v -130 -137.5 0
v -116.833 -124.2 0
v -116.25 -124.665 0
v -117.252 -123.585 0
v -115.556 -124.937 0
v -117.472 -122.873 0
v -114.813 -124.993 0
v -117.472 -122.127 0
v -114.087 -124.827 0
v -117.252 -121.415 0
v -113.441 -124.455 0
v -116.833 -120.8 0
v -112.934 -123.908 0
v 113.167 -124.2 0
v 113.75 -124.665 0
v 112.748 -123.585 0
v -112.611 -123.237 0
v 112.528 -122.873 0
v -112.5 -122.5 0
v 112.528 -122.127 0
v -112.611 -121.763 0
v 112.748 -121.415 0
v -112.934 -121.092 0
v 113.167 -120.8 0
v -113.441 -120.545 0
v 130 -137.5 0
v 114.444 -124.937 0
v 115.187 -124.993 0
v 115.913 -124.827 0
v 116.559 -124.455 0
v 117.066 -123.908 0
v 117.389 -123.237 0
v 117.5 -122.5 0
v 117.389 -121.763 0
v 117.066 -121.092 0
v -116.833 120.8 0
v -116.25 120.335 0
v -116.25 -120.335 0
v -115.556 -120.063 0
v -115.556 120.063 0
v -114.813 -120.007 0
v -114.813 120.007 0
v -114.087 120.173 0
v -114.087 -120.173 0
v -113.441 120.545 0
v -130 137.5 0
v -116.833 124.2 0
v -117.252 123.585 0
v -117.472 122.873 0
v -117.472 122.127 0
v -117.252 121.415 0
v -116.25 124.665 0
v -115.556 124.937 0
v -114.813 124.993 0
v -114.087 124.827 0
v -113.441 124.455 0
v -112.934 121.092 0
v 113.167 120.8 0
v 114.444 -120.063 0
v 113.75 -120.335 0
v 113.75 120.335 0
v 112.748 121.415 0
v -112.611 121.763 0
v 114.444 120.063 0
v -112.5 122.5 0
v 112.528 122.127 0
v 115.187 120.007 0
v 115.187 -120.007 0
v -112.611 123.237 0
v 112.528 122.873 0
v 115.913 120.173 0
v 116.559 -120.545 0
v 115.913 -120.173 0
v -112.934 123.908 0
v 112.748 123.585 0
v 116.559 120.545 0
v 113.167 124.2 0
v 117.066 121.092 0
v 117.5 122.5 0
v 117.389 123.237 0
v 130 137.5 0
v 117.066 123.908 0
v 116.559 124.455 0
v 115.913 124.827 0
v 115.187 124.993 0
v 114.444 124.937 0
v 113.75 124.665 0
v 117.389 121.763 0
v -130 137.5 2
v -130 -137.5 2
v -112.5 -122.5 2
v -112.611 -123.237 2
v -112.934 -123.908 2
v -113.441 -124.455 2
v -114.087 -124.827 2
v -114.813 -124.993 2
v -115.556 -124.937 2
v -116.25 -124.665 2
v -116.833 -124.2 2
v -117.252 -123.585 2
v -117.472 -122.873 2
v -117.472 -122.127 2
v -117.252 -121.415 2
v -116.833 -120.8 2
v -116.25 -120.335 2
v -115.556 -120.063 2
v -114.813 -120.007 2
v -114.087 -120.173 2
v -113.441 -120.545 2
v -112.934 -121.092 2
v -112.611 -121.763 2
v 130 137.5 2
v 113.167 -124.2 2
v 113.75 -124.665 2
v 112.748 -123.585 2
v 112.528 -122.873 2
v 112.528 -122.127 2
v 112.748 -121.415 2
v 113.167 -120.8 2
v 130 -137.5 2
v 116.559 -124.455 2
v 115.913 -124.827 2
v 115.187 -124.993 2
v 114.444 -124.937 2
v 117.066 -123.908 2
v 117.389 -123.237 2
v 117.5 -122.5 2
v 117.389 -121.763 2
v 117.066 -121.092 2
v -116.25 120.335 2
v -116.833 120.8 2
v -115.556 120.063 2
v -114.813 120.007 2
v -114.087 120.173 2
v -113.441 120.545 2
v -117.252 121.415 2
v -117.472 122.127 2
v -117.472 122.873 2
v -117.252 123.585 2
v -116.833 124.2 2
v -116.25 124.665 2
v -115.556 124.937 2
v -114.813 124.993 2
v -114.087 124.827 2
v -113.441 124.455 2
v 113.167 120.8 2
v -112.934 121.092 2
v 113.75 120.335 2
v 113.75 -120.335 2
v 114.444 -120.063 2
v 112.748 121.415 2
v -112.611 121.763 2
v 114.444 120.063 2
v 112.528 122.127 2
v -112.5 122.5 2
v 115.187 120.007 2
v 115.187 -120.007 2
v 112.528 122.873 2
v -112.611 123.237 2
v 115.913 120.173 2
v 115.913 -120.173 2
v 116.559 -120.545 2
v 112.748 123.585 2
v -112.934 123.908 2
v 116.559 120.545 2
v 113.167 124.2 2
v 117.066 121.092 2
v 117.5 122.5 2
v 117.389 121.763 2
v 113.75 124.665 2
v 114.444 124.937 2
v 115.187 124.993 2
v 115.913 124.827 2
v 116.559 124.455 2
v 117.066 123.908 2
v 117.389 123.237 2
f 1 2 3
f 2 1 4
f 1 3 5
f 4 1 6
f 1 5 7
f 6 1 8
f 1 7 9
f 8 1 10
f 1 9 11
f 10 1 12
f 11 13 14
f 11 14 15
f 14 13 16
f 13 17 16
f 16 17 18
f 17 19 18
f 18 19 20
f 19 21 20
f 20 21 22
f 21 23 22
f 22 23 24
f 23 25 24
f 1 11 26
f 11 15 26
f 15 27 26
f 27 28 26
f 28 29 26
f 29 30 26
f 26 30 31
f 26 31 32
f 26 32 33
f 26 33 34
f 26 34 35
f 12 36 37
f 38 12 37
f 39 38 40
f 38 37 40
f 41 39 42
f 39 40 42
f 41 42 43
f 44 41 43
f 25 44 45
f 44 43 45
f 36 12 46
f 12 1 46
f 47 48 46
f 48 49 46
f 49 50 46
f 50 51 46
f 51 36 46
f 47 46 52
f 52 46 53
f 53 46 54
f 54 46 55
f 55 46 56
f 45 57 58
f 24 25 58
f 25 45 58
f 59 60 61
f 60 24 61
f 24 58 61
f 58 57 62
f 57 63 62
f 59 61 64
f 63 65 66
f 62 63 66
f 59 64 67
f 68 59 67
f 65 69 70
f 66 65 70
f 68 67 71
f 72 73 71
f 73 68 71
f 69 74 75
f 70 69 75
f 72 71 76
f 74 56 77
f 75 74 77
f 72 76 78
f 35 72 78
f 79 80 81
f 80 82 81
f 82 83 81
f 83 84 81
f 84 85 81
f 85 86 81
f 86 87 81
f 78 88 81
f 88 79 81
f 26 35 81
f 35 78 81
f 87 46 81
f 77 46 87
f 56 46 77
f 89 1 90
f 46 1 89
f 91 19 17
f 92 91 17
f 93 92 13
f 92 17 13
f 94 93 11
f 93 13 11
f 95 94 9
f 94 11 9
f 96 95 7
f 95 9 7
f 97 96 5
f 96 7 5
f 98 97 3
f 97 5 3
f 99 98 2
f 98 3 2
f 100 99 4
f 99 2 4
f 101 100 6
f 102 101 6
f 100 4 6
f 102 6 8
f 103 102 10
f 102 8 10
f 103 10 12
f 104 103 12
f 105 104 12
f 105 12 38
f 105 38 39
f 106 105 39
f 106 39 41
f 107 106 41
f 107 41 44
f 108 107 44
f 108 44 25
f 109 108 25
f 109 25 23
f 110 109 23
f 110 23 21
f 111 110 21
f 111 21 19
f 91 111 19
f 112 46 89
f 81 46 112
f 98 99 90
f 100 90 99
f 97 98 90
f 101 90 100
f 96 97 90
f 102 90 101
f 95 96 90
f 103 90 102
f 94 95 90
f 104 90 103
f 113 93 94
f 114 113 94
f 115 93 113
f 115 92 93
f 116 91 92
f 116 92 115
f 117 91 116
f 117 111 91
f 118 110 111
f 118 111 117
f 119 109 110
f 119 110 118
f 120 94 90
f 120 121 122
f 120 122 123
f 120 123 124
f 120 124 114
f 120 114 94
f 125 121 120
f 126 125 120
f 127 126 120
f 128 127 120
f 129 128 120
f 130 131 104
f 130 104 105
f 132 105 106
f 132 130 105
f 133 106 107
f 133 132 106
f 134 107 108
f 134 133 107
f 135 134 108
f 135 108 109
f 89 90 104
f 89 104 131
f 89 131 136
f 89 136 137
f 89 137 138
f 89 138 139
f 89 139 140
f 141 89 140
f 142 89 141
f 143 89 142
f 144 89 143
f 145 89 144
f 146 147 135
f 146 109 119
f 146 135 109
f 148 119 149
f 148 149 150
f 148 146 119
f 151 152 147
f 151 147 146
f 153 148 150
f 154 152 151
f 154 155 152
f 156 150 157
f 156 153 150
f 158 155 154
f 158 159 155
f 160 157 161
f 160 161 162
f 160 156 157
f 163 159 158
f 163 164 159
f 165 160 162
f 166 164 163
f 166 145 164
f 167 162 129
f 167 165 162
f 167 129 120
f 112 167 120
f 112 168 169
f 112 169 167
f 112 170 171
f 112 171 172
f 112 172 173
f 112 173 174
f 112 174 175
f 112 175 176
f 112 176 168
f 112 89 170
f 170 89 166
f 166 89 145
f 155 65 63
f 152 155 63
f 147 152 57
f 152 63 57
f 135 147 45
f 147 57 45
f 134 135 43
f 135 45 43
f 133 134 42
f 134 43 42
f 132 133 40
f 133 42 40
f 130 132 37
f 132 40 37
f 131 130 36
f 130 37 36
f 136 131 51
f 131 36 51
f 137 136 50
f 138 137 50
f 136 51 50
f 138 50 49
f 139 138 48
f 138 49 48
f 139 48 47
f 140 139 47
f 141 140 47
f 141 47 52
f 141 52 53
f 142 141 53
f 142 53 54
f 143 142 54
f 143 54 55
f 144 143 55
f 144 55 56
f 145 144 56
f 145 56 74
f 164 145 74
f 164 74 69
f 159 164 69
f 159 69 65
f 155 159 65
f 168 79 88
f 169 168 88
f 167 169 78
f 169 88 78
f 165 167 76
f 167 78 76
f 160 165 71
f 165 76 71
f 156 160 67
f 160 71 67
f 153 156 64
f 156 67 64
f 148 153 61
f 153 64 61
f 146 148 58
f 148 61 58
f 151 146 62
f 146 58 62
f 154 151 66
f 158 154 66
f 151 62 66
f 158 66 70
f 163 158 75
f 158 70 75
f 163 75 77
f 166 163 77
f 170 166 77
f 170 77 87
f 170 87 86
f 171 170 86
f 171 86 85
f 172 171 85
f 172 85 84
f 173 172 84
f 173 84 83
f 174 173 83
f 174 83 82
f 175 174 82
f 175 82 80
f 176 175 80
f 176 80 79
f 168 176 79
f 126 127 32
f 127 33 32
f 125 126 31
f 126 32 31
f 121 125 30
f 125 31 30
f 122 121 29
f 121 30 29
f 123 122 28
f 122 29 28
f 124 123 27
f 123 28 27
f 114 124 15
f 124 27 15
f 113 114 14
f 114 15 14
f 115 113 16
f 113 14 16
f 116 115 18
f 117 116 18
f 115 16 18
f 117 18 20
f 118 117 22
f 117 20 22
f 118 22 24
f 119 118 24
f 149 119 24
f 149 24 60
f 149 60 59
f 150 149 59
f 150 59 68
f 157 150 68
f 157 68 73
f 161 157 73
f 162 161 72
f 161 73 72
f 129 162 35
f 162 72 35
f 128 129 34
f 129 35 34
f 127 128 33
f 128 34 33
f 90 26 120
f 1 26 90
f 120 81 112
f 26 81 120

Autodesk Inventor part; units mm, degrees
ref_plane "YZ Plane" through (0, 0, 0) normal (1, 0, 0) x (0, 1, 0)
ref_plane "XZ Plane" through (0, 0, 0) normal (0, 1, 0) x (-1, 0, 0)
ref_plane "XY Plane" through (0, 0, 0) normal (0, 0, 1) x (1, 0, 0)
sketch "Esquisse1" plane through (0, 0, 0) normal (0, 0, 1) x (1, 0, 0)
  line L0 (-130, 137.5) -> (130, 137.5)
  line L1 (130, 137.5) -> (130, -137.5)
  line L2 (130, -137.5) -> (-130, -137.5)
  line L3 (-130, -137.5) -> (-130, 137.5)
  line L4 (-130, 137.5) -> (130, -137.5) construction
  line L5 (130, 137.5) -> (-130, -137.5) construction
  line L6 (-117.5, -125) -> (117.5, -125)
  line L7 (117.5, -125) -> (117.5, 125)
  line L8 (117.5, 125) -> (-117.5, 125)
  line L9 (-117.5, 125) -> (-117.5, -125)
  line L10 (-117.5, -125) -> (117.5, 125) construction
  line L11 (117.5, -125) -> (-117.5, 125) construction
  circle A0 centre (-115, 122.5) radius 2.5
  circle A1 centre (115, 122.5) radius 2.5
  circle A2 centre (-115, -122.5) radius 2.5
  circle A3 centre (115, -122.5) radius 2.5
  point P0 (0, 0)
  dimension "d0" = 260
  dimension "d1" = 275
  dimension "d2" = 12.5
  dimension "d3" = 12.5
  dimension "d4" = 5
  dimension "d5" = 5
  dimension "d6" = 5
  dimension "d7" = 5
extrude "Extrusion1" add sketch "Esquisse1" along normal blind 2 contours L0 L1 L2 L3 | L9 A2 L6 | A2 L9 A0 L8 A1 L7 A3 L6 | A3 L7 L6 | L9 L8 A0 | A1 L8 L7
properties part number "PlaqueArmoire"
